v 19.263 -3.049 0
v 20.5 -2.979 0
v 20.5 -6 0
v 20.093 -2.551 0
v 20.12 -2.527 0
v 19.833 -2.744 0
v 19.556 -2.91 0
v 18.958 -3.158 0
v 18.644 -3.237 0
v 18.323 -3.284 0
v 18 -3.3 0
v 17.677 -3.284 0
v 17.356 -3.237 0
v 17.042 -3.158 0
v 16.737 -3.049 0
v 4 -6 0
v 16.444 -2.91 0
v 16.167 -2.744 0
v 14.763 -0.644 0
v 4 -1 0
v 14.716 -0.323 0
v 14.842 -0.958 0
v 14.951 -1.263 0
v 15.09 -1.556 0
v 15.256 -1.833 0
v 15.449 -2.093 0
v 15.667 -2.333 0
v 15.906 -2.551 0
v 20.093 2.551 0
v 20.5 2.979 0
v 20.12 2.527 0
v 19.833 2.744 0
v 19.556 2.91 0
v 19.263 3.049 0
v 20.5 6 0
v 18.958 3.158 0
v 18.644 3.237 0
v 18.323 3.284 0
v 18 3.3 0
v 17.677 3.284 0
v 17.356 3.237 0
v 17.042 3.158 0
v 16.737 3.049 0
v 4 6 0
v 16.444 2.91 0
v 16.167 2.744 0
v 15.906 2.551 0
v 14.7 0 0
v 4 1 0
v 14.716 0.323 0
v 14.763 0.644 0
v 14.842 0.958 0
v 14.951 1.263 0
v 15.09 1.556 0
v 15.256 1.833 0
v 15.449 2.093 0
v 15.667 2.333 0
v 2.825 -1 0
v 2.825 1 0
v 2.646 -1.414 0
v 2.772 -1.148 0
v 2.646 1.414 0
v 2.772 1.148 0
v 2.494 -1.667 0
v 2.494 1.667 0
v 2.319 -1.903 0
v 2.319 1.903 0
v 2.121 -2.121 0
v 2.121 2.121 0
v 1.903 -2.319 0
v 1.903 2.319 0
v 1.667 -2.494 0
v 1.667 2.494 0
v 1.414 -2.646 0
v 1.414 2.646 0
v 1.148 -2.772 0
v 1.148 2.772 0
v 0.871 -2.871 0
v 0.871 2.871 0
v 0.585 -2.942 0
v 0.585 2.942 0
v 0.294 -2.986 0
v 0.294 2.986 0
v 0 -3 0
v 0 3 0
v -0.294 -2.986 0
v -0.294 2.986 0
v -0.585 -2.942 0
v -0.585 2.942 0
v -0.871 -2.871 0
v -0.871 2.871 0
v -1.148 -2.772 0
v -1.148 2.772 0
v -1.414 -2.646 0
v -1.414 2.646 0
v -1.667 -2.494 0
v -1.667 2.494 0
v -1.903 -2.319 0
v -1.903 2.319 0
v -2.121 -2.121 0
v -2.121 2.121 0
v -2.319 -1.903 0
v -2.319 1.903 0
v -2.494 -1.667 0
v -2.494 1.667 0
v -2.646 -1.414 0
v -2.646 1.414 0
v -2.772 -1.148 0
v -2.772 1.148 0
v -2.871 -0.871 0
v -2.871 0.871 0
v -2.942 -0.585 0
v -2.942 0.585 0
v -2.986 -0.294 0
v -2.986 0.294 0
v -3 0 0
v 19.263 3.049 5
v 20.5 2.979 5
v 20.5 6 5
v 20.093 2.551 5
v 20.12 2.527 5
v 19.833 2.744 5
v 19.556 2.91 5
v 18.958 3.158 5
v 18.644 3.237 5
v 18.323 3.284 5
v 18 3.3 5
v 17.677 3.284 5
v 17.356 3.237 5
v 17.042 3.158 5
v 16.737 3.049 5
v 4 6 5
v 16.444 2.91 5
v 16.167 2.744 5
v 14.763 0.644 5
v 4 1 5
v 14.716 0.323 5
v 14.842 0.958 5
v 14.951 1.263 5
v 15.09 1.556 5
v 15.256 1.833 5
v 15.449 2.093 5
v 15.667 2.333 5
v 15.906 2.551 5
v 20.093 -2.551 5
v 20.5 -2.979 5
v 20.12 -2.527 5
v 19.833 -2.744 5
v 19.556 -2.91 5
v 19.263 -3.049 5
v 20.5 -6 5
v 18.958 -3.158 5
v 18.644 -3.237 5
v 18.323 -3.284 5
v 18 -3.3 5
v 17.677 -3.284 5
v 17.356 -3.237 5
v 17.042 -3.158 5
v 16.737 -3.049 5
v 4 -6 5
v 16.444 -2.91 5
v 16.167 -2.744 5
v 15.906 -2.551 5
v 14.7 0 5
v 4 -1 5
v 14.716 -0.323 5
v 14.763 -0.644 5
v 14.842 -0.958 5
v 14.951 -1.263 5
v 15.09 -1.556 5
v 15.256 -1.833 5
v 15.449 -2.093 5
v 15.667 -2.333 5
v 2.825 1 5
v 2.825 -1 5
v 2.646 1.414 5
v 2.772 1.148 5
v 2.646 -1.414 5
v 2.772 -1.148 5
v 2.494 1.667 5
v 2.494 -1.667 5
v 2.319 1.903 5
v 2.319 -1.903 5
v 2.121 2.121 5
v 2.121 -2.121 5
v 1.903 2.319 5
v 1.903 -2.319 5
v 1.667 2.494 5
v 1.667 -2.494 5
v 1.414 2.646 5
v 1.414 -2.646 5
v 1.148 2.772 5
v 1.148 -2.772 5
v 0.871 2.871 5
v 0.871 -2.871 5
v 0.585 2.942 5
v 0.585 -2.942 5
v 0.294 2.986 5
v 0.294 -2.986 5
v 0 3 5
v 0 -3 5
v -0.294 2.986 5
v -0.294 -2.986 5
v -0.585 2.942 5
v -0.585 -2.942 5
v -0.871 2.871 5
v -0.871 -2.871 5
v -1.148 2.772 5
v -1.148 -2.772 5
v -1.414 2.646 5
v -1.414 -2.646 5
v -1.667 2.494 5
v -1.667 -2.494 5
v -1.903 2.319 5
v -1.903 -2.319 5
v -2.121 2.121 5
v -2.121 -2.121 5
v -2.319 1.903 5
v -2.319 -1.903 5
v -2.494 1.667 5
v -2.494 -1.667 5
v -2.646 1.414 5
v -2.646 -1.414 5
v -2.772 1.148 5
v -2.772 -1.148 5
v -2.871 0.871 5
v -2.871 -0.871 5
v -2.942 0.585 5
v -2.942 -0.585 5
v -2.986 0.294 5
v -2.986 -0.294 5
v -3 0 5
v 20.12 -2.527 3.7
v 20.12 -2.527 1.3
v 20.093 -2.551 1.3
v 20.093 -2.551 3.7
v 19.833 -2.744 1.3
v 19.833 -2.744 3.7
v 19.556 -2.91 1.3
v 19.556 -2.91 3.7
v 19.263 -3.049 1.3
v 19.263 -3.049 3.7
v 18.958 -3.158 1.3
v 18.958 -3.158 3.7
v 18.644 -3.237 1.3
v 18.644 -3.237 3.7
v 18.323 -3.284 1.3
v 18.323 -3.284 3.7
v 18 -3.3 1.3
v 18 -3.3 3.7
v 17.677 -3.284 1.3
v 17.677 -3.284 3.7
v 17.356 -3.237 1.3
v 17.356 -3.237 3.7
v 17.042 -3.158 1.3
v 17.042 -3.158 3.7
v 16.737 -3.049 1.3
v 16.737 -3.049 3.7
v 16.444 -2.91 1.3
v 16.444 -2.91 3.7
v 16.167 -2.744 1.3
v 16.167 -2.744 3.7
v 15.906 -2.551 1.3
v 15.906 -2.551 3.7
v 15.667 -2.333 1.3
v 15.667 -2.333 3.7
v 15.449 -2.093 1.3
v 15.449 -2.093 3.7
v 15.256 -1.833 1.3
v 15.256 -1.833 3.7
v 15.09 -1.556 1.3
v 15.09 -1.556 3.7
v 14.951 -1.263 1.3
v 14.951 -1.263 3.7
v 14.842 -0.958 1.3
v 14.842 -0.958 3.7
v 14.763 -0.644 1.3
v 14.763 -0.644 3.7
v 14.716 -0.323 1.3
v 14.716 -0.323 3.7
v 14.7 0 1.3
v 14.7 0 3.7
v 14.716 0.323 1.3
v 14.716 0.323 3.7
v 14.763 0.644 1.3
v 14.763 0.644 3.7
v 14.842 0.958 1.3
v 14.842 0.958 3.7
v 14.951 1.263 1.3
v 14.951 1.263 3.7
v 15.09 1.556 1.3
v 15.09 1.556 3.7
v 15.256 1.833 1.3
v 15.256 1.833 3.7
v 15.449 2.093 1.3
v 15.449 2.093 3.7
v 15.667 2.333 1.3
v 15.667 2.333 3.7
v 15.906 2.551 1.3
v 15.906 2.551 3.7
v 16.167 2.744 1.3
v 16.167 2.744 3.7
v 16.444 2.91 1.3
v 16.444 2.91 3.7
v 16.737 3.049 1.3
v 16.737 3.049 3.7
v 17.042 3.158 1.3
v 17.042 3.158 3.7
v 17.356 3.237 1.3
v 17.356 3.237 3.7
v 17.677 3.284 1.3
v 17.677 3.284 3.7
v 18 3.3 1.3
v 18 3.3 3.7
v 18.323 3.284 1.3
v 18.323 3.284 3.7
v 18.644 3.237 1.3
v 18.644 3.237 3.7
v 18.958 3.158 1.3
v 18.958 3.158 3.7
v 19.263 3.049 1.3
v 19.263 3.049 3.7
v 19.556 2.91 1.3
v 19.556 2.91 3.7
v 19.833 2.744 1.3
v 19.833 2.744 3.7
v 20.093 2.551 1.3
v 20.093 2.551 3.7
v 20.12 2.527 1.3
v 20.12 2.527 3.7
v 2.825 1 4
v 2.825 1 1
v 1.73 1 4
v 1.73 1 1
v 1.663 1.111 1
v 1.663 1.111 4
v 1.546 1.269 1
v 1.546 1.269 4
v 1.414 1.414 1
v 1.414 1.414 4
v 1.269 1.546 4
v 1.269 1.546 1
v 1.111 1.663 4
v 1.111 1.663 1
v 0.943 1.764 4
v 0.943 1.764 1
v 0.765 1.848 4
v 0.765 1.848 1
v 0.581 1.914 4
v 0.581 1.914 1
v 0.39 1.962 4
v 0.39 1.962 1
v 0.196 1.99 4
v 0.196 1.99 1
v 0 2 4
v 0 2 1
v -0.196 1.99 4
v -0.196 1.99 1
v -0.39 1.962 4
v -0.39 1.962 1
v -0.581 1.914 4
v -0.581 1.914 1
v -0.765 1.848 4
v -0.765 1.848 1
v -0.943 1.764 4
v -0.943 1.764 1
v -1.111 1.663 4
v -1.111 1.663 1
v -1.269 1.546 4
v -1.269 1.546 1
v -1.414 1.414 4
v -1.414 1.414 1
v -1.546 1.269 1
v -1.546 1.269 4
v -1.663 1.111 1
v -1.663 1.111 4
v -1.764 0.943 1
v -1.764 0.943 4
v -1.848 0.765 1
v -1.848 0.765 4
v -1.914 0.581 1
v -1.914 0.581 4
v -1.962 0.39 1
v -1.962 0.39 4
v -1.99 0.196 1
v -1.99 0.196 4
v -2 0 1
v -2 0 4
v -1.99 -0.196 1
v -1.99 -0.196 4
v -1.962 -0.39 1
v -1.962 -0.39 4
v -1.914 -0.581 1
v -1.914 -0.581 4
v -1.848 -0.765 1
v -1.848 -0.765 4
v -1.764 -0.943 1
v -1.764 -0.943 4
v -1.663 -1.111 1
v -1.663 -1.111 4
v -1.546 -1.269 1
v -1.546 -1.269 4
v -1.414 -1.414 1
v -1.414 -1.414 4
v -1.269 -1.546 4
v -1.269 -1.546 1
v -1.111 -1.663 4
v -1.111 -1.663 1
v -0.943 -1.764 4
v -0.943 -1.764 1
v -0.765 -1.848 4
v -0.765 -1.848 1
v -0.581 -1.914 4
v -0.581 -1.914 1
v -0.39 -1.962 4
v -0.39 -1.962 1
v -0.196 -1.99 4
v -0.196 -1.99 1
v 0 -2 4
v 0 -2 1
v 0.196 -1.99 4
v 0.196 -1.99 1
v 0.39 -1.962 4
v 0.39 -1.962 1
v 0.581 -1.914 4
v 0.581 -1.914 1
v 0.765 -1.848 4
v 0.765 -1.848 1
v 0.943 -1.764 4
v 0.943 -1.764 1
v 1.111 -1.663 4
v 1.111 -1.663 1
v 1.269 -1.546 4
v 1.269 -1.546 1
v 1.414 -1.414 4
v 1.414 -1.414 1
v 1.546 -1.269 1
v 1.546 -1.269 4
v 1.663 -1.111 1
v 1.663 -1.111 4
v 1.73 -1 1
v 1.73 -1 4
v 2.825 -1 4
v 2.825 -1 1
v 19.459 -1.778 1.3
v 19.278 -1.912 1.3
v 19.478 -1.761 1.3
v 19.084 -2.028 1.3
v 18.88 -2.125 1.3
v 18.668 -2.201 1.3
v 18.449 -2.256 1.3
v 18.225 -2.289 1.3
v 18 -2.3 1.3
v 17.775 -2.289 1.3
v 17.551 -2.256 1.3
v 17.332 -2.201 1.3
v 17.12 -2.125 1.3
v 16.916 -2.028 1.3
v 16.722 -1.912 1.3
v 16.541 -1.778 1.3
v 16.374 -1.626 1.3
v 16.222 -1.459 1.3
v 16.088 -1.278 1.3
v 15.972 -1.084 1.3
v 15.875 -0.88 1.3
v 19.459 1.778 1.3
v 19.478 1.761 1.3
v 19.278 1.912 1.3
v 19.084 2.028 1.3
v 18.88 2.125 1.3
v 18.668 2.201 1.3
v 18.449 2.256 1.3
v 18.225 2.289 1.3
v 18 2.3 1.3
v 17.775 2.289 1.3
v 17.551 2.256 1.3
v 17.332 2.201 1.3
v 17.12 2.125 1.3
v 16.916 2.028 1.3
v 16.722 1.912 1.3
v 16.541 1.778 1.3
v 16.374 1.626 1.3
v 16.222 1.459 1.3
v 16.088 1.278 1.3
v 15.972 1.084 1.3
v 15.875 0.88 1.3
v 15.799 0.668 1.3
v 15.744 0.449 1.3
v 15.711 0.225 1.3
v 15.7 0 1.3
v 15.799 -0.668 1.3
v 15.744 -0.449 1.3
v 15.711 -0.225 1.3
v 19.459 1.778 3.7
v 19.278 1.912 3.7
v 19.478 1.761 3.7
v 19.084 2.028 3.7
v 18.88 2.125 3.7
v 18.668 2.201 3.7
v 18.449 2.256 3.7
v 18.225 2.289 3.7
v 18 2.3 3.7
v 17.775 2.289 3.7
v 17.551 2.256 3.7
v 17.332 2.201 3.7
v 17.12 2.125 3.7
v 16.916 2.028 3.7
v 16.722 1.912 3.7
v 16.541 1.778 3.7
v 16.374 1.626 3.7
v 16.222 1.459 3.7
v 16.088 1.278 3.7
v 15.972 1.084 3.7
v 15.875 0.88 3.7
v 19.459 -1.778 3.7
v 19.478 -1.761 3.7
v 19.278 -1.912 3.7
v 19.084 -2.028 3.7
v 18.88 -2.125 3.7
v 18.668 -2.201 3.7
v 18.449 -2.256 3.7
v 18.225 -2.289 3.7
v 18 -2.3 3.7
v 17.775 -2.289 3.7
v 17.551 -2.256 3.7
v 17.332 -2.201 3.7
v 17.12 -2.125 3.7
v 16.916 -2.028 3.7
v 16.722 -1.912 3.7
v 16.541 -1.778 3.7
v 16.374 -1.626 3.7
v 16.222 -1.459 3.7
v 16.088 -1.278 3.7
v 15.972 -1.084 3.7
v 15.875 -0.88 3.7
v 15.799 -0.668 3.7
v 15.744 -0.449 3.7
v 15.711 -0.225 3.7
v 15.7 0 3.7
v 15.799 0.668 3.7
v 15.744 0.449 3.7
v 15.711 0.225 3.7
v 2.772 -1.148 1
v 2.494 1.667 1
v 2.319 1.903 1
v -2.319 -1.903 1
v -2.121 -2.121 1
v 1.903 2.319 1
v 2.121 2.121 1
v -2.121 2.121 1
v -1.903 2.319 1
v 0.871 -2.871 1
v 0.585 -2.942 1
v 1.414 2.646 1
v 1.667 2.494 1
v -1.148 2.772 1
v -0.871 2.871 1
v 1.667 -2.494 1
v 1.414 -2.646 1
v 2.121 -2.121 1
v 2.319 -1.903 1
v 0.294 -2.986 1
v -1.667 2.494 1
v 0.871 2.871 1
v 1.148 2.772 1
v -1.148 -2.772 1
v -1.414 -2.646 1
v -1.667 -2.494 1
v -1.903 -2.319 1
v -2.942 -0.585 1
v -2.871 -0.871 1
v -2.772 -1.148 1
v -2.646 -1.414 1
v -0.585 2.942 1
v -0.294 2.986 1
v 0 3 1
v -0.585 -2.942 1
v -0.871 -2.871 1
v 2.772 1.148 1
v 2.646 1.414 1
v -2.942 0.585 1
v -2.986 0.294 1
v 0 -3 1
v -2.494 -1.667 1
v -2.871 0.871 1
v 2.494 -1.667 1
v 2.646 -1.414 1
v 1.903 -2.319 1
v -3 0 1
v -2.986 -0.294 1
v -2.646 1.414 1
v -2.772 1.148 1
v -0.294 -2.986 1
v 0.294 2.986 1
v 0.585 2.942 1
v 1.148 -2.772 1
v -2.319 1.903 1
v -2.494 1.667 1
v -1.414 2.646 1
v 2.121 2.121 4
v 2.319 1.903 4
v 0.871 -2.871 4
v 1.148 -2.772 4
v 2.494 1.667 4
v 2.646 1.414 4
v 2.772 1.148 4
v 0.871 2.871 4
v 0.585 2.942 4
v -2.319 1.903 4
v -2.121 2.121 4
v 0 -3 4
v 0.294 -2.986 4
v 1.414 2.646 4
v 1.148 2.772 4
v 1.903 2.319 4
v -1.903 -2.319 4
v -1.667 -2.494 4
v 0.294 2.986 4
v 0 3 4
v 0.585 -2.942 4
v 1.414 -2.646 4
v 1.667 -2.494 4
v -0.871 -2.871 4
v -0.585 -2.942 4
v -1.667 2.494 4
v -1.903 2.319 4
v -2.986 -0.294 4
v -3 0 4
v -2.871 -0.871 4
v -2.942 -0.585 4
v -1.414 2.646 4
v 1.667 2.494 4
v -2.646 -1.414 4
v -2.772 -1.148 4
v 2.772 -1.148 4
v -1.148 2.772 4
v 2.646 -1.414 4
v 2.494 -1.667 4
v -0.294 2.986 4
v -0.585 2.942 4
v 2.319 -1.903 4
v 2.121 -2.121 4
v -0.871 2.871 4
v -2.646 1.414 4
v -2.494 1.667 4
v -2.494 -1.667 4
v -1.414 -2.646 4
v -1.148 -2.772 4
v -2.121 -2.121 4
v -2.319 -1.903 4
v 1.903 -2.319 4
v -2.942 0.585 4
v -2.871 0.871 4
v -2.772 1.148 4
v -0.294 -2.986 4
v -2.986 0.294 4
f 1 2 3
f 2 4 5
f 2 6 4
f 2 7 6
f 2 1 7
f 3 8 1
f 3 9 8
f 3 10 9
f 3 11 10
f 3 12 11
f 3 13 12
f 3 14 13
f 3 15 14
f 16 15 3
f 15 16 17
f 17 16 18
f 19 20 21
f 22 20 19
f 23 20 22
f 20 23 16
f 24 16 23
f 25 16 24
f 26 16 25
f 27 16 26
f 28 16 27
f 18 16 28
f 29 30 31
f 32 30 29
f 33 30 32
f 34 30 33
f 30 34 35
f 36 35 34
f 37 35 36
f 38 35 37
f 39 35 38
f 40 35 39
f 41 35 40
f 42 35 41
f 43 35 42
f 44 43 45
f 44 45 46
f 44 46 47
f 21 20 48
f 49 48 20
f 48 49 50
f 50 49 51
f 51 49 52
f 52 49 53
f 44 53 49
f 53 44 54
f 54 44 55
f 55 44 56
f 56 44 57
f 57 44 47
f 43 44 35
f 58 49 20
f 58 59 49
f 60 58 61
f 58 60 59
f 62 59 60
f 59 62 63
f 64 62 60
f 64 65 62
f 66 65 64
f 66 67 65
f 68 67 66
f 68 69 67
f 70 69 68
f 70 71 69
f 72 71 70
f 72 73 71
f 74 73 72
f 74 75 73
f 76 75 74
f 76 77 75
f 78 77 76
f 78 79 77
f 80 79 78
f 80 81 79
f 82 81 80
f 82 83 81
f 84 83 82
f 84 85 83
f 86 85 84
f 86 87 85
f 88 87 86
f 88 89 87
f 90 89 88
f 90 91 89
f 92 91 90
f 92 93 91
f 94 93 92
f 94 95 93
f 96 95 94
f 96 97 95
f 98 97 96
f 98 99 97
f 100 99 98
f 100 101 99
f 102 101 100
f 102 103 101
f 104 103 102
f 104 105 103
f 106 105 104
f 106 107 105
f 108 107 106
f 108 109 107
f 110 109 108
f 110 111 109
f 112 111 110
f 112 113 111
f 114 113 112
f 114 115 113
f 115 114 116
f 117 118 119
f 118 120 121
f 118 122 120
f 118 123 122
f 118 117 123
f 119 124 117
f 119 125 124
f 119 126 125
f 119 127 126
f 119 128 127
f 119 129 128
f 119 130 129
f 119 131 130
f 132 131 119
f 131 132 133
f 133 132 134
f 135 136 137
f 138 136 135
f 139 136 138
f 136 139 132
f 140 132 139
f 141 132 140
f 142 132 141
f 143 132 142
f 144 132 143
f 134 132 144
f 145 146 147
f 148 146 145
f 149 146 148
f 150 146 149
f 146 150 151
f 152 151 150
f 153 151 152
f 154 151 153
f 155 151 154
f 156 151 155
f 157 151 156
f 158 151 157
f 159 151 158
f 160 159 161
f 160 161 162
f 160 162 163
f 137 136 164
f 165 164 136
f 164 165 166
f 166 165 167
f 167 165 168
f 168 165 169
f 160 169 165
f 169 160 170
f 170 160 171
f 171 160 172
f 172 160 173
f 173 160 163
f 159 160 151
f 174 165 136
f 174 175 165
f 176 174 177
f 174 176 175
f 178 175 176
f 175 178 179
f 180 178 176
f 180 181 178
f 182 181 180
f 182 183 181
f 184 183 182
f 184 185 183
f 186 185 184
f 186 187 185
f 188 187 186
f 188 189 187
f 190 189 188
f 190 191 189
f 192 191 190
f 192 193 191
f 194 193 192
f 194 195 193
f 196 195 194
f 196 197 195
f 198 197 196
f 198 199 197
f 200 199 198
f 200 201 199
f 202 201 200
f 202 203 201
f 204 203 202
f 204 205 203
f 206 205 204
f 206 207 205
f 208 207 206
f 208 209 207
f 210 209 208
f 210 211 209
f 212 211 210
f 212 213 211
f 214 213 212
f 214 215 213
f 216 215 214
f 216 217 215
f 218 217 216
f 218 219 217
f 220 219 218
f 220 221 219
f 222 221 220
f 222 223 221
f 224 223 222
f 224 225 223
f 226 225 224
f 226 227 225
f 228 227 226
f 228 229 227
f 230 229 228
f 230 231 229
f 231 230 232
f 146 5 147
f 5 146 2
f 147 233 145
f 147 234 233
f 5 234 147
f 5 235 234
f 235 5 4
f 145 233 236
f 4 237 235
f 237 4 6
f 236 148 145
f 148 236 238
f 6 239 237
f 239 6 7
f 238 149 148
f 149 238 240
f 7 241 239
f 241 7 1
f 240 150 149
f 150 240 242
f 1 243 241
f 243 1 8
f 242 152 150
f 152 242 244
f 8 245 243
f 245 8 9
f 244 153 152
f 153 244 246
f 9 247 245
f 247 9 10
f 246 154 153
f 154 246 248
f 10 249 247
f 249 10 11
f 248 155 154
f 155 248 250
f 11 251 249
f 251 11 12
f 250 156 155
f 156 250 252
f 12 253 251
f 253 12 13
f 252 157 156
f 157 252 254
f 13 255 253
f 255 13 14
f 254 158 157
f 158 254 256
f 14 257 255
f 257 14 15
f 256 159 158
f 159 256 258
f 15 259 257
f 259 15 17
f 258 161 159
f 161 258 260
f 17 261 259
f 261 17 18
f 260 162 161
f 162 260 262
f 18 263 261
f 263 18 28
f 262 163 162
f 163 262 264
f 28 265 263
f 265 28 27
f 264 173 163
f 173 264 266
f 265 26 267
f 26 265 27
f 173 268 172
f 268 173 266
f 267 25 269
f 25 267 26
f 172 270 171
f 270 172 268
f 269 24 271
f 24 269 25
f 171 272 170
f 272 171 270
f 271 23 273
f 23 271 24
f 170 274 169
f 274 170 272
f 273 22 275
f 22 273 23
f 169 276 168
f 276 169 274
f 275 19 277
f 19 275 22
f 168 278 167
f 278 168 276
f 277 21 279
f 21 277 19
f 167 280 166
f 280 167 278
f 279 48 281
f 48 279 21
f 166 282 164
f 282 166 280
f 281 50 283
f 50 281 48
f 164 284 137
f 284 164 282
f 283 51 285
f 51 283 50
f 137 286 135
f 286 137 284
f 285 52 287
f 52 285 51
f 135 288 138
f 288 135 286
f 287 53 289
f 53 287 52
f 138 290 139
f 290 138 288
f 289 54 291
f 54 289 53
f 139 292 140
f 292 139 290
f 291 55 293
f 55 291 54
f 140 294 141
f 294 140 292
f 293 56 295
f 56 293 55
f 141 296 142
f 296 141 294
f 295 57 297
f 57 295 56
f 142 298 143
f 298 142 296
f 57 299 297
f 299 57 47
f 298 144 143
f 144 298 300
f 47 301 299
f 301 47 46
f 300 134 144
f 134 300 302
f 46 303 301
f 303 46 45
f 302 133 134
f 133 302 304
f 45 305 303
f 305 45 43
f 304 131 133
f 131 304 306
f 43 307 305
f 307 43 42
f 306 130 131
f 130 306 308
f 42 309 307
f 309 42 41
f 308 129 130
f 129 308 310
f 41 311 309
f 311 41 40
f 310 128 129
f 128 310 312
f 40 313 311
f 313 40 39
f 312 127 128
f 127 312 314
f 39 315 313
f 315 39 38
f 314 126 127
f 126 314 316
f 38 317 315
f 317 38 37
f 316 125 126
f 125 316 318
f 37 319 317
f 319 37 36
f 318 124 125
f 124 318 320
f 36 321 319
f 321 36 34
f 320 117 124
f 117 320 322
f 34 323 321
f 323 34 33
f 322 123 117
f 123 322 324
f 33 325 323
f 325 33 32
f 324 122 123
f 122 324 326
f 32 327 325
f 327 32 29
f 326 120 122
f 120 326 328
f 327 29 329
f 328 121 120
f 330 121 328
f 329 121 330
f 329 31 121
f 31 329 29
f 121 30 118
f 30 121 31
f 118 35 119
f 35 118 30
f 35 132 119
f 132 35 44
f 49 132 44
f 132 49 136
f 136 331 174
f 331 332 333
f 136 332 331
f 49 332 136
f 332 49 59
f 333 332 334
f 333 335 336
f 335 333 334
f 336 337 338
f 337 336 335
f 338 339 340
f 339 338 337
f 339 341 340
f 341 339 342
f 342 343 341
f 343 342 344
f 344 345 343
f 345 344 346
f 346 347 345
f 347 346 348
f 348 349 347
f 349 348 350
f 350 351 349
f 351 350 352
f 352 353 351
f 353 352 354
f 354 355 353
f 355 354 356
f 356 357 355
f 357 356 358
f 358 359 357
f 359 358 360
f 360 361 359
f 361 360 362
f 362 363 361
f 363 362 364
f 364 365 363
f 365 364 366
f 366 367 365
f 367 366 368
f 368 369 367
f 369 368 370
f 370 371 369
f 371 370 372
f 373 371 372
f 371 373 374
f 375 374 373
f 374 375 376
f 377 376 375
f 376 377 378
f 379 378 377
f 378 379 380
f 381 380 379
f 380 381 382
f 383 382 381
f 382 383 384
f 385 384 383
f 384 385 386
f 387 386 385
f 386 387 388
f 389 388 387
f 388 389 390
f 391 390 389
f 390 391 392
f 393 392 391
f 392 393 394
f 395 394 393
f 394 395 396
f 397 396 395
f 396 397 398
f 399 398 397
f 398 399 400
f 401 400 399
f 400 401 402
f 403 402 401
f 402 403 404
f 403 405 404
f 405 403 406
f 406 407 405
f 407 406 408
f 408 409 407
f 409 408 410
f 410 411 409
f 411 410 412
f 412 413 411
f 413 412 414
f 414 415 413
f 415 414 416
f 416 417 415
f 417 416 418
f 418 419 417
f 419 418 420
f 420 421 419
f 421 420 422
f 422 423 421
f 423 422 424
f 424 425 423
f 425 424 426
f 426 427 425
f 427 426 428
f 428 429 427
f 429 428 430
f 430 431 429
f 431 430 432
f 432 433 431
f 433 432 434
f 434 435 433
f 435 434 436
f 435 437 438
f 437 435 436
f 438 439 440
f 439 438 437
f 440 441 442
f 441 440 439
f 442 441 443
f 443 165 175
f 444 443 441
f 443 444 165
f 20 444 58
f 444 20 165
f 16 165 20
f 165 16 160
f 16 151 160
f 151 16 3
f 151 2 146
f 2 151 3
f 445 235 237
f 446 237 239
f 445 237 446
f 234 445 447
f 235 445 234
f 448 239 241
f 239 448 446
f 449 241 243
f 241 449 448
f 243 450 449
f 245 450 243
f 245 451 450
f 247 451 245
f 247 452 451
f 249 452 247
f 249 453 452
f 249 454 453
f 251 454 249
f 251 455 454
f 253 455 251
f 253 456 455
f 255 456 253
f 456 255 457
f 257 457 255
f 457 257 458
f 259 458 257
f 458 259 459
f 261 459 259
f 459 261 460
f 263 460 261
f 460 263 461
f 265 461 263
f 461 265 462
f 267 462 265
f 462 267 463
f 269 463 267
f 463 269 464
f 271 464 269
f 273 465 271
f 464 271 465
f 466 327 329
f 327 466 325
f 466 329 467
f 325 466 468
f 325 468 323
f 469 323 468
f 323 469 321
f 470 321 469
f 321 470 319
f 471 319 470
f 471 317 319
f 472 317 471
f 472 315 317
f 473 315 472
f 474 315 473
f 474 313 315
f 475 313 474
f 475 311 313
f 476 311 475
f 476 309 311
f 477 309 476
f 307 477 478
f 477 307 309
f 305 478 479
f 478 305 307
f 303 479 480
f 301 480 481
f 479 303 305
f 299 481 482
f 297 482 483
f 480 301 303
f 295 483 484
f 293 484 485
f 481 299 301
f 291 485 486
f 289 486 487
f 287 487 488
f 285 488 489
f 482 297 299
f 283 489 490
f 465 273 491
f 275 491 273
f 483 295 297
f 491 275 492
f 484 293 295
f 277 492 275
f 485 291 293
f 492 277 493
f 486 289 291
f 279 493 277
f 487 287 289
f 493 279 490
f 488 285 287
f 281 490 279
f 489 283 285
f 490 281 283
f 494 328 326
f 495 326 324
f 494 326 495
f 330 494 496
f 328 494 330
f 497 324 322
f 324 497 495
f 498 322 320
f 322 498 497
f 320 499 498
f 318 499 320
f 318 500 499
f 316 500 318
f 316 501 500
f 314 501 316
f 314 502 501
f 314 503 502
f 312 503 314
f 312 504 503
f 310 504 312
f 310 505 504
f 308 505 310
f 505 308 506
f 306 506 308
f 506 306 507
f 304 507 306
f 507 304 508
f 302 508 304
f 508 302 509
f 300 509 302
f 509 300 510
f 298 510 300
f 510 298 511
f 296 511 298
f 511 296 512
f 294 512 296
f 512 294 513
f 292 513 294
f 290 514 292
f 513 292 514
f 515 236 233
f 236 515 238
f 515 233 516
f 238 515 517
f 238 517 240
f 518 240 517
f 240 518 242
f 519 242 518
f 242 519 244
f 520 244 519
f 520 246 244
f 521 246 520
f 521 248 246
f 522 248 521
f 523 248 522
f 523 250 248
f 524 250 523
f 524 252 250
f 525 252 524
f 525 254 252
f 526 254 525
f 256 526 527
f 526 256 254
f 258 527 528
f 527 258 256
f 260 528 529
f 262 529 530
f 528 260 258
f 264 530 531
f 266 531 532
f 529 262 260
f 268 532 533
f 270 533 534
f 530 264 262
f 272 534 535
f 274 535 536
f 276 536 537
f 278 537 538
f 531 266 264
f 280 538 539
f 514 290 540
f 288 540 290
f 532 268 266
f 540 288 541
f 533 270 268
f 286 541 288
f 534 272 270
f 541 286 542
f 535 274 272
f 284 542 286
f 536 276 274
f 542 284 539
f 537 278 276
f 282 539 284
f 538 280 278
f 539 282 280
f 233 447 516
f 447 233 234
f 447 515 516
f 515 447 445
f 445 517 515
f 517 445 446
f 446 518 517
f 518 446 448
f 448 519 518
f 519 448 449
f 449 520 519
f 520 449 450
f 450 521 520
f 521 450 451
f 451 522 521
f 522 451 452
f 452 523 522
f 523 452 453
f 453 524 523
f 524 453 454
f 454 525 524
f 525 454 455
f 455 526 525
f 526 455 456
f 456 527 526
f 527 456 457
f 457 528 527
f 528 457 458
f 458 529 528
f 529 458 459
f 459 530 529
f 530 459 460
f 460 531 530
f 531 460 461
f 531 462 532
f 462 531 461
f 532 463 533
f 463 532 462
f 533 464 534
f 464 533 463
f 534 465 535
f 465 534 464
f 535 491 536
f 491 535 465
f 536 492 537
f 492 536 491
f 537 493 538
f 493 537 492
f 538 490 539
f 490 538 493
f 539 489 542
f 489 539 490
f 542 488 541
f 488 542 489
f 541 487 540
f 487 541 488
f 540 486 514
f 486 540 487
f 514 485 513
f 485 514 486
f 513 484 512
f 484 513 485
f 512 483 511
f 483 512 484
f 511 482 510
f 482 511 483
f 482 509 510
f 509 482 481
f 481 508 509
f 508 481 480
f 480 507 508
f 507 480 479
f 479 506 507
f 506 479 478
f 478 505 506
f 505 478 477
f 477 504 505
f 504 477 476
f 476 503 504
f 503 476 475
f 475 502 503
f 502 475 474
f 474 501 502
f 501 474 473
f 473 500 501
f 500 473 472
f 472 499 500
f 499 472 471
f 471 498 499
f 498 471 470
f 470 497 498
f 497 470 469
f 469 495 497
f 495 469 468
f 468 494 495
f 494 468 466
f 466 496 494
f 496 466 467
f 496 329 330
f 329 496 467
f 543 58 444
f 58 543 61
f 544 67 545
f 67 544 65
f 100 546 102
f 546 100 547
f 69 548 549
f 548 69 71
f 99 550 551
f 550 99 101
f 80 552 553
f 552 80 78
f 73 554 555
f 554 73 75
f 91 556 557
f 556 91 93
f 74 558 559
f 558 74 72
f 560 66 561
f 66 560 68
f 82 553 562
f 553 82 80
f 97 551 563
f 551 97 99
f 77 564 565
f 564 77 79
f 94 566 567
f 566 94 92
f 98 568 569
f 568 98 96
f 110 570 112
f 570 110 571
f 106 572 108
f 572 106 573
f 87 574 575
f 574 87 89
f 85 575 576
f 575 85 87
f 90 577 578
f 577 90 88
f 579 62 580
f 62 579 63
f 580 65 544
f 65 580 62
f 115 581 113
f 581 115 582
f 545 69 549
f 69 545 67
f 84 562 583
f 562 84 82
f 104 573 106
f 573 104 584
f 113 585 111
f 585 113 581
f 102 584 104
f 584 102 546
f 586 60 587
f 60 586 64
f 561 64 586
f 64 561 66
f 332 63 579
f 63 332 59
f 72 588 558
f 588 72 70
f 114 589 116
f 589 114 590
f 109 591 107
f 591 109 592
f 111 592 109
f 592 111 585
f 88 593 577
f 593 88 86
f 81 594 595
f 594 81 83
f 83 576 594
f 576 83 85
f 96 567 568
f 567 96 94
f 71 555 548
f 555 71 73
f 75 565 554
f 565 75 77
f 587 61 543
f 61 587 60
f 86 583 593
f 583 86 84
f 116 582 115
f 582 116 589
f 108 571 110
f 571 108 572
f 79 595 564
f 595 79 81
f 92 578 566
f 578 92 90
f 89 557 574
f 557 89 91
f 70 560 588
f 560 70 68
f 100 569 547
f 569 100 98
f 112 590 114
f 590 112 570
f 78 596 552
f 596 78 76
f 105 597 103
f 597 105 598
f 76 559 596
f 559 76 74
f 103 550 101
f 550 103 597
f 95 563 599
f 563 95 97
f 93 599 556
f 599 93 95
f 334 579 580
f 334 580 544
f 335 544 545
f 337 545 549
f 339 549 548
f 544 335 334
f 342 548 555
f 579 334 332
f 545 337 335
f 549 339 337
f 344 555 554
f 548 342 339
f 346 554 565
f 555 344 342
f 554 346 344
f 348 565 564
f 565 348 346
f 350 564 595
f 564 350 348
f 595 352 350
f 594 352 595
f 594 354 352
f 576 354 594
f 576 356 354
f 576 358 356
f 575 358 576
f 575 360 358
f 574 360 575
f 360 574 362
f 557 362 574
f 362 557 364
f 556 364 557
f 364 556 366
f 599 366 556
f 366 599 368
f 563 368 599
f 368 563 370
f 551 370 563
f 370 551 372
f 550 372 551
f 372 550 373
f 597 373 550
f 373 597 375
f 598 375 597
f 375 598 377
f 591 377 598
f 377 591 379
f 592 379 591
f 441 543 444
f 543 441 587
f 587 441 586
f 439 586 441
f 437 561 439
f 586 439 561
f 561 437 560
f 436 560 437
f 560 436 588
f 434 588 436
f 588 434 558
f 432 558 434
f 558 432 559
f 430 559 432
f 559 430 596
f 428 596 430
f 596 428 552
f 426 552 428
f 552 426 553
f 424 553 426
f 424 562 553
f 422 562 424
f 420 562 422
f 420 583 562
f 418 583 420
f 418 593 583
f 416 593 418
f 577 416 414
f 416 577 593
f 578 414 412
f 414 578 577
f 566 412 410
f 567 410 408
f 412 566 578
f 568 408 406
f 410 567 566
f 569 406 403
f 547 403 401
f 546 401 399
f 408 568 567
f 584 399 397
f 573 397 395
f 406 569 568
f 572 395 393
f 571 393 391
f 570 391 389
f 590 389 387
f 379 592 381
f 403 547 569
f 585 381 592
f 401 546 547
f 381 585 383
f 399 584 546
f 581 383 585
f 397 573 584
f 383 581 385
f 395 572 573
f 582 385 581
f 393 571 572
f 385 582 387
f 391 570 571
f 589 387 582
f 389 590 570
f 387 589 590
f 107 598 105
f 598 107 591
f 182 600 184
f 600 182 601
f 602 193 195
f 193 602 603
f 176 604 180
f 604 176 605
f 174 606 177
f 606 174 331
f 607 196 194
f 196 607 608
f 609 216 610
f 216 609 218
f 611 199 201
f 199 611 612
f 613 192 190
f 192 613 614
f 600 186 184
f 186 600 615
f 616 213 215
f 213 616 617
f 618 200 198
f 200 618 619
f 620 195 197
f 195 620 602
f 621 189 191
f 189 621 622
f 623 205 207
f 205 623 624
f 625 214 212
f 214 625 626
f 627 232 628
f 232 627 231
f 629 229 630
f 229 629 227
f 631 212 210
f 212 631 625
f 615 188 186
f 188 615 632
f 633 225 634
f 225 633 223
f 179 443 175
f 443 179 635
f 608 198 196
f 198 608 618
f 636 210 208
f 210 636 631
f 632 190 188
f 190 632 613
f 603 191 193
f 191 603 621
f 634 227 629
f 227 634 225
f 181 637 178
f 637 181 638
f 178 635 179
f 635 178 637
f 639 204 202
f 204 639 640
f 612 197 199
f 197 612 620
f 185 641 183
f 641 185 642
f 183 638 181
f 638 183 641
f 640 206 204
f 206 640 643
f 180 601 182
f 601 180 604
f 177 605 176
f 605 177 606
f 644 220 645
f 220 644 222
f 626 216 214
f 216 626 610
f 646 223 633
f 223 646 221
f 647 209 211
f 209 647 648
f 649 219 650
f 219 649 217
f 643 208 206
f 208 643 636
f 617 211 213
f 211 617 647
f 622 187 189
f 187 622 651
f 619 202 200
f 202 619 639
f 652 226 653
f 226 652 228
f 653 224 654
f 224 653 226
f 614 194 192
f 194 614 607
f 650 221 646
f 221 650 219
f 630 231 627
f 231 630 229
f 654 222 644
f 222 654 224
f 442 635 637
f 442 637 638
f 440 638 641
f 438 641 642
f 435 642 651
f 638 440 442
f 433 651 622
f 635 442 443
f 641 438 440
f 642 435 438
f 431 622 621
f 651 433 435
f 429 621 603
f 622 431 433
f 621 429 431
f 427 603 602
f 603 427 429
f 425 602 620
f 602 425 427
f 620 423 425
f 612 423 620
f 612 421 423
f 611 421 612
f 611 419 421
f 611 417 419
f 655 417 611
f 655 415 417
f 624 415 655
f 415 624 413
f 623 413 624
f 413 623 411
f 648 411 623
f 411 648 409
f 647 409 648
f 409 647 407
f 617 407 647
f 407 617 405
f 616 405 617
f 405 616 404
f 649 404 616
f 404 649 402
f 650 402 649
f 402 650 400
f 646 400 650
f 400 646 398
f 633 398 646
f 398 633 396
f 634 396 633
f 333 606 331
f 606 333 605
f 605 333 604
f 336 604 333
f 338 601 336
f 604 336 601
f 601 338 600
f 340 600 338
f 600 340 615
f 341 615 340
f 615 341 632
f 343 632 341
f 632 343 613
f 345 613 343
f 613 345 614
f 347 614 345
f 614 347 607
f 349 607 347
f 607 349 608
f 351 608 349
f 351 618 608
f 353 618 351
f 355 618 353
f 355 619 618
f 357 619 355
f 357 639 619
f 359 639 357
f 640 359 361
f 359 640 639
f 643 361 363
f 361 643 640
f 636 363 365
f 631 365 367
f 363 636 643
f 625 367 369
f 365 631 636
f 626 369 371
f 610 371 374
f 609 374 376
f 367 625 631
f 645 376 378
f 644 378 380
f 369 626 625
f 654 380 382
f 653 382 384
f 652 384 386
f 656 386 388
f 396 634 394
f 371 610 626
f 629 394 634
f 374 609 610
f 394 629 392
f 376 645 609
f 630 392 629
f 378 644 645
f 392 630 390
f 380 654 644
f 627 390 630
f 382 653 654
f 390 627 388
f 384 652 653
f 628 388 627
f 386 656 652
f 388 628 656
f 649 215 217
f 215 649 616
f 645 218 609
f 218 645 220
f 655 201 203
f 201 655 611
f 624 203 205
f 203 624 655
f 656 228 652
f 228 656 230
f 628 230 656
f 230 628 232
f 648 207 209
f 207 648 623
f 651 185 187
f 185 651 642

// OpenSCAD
part = "link"; // [link, assembly]
cadverify_only = "";
module instance(name, part, unit = 1) {
    echo(cadverify_instance = [name, part, unit]);
    if (cadverify_only == "" || cadverify_only == name) children();
}

// Parameters (mm)
pitch = 18;          // pin-to-bore distance
link_w = 12;         // width (Y)
link_t = 5;          // thickness (Z)
pin_d = 4;           // pin shaft diameter
bore_d = 4.6;        // bore diameter (0.3 radial clearance)
cap_d = 6;           // cap diameter
cap_h = 1;           // cap thickness
gap_z = 0.3;         // vertical clearance cap<->knuckle
kn_h = 2.4;          // knuckle height = 5-2*1-2*0.3
kn_out_d = 7.6;      // knuckle outer diameter (1.5 wall)
cap_cav_d = 6.6;     // cap cavity diameter (0.3 radial clearance)
neck_w = 2;          // neck width
slot_half = 50;      // slot half-angle (deg), allows +-30 deg swing
yoke_east = 20.5;    // full-height yoke east extent (local X)
$fn = 64;

module link_geom() {
    bore_x = pitch;
    cap_r = cap_d/2;
    cav_r = cap_cav_d/2;
    pin_r = pin_d/2;
    bore_r = bore_d/2;
    kn_out_r = kn_out_d/2;
    // far points for slot wedge (full height + middle)
    // wedge from bore center to the east, half-angle slot_half
    wedge_far = 30;
    dy_far = wedge_far * tan(slot_half);
    // ---- full height (0..5): yoke + neck + pin shaft ----
    linear_extrude(height = link_t, convexity = 8) {
        difference() {
            union() {
                // pin shaft disc
                translate([0,0]) circle(r = pin_r);
                // neck rect X[0,5] Y[-1,1]
                translate([0,-neck_w/2]) square([5, neck_w]);
                // yoke base rect X[4,yoke_east] Y[-6,6]
                translate([4,-link_w/2]) square([yoke_east-4, link_w]);
            }
            // cap cavity (for next link caps)
            translate([bore_x,0]) circle(r = cav_r);
            // slot wedge for next-link neck swing (full height)
            polygon(points = [[bore_x,0],[bore_x+wedge_far, dy_far],[bore_x+wedge_far, -dy_far]]);
        }
    }
    // ---- middle knuckle ring (1.3..3.7) ----
    kn_bot = cap_h + gap_z; // 1.3
    translate([0,0,kn_bot])
    linear_extrude(height = kn_h, convexity = 8) {
        difference() {
            translate([bore_x,0]) circle(r = kn_out_r);
            translate([bore_x,0]) circle(r = bore_r);
            polygon(points = [[bore_x,0],[bore_x+wedge_far, dy_far],[bore_x+wedge_far, -dy_far]]);
        }
    }
    // ---- caps ----
    translate([0,0,0]) cylinder(h = cap_h, r = cap_r);
    translate([0,0,link_t-cap_h]) cylinder(h = cap_h, r = cap_r);
}

if (part == "assembly") {
    instance("link1", "link", 1) translate([0,0,0]) link_geom();
    instance("link2", "link", 1) translate([18,0,0]) link_geom();
    instance("link3", "link", 1) translate([36,0,0]) link_geom();
    echo(cadverify_spec = [
        ["bounds", [[-3, -6, 0], [56.5, 6, 5]]],
        ["support_faces", [["bed", "-z", 200]]],
        ["motions", [
            ["bend", ["link3"], "rotate", [36, 0, 0], [0, 0, 1], [-30, 30]]
        ]],
        ["assembly_order", [
            [["link1", "link2", "link3"], [0, 0, 0]]
        ]],
        ["print_in_place", 0.3],
        ["overhangs_allowed", [
            ["pin cap link1", [[-3, -3, 3.8], [3, 3, 4.2]]],
            ["knuckle joint1", [[14.5, -3.5, 1.0], [21, 3.5, 1.5]]],
            ["pin cap link2", [[15, -3, 3.8], [21, 3, 4.2]]],
            ["knuckle joint2", [[32.5, -3.5, 1.0], [39, 3.5, 1.5]]],
            ["pin cap link3", [[33, -3, 3.8], [39, 3, 4.2]]],
            ["knuckle end", [[50.5, -3.5, 1.0], [57, 3.5, 1.5]]]
        ]],
        ["held", ["link1", "link2", "link3"]]
    ]);
} else {
    link_geom();
    echo(cadverify_spec = [
        ["bounds", [[-3, -6, 0], [20.5, 6, 5]]],
        ["bodies", 1],
        ["through_holes", 0],
        ["support_faces", [["bed", "-z", 100]]],
        ["overhangs_allowed", [
            ["pin cap", [[-3, -3, 3.8], [3, 3, 4.2]]],
            ["knuckle ceiling", [[14.5, -3.5, 1.0], [21, 3.5, 1.5]]]
        ]],
        ["copies", 3],
        ["details", [
            ["body", "material", [[4, -6, 0], [14, 6, 5]], 0.85],
            ["neck", "material", [[0, -1, 0], [5, 1, 5]], 0.8],
            ["knuckle", "material", [[14.2, -3.8, 1.3], [21.8, 3.8, 3.7]], 0.25],
            ["slot", "void", [[19, -1, 0], [21, 1, 5]], 0.8],
            ["cap_cavity", "void", [[14.7, -3.3, 0], [21.3, 3.3, 1]], 0.5],
            ["wall", "thickness", [25, 0, 2.5], [-1, 0, 0], 1.5],
            ["floor", "thickness", [9, 0, -1], [0, 0, 1], 5]
        ]]
    ]);
}
